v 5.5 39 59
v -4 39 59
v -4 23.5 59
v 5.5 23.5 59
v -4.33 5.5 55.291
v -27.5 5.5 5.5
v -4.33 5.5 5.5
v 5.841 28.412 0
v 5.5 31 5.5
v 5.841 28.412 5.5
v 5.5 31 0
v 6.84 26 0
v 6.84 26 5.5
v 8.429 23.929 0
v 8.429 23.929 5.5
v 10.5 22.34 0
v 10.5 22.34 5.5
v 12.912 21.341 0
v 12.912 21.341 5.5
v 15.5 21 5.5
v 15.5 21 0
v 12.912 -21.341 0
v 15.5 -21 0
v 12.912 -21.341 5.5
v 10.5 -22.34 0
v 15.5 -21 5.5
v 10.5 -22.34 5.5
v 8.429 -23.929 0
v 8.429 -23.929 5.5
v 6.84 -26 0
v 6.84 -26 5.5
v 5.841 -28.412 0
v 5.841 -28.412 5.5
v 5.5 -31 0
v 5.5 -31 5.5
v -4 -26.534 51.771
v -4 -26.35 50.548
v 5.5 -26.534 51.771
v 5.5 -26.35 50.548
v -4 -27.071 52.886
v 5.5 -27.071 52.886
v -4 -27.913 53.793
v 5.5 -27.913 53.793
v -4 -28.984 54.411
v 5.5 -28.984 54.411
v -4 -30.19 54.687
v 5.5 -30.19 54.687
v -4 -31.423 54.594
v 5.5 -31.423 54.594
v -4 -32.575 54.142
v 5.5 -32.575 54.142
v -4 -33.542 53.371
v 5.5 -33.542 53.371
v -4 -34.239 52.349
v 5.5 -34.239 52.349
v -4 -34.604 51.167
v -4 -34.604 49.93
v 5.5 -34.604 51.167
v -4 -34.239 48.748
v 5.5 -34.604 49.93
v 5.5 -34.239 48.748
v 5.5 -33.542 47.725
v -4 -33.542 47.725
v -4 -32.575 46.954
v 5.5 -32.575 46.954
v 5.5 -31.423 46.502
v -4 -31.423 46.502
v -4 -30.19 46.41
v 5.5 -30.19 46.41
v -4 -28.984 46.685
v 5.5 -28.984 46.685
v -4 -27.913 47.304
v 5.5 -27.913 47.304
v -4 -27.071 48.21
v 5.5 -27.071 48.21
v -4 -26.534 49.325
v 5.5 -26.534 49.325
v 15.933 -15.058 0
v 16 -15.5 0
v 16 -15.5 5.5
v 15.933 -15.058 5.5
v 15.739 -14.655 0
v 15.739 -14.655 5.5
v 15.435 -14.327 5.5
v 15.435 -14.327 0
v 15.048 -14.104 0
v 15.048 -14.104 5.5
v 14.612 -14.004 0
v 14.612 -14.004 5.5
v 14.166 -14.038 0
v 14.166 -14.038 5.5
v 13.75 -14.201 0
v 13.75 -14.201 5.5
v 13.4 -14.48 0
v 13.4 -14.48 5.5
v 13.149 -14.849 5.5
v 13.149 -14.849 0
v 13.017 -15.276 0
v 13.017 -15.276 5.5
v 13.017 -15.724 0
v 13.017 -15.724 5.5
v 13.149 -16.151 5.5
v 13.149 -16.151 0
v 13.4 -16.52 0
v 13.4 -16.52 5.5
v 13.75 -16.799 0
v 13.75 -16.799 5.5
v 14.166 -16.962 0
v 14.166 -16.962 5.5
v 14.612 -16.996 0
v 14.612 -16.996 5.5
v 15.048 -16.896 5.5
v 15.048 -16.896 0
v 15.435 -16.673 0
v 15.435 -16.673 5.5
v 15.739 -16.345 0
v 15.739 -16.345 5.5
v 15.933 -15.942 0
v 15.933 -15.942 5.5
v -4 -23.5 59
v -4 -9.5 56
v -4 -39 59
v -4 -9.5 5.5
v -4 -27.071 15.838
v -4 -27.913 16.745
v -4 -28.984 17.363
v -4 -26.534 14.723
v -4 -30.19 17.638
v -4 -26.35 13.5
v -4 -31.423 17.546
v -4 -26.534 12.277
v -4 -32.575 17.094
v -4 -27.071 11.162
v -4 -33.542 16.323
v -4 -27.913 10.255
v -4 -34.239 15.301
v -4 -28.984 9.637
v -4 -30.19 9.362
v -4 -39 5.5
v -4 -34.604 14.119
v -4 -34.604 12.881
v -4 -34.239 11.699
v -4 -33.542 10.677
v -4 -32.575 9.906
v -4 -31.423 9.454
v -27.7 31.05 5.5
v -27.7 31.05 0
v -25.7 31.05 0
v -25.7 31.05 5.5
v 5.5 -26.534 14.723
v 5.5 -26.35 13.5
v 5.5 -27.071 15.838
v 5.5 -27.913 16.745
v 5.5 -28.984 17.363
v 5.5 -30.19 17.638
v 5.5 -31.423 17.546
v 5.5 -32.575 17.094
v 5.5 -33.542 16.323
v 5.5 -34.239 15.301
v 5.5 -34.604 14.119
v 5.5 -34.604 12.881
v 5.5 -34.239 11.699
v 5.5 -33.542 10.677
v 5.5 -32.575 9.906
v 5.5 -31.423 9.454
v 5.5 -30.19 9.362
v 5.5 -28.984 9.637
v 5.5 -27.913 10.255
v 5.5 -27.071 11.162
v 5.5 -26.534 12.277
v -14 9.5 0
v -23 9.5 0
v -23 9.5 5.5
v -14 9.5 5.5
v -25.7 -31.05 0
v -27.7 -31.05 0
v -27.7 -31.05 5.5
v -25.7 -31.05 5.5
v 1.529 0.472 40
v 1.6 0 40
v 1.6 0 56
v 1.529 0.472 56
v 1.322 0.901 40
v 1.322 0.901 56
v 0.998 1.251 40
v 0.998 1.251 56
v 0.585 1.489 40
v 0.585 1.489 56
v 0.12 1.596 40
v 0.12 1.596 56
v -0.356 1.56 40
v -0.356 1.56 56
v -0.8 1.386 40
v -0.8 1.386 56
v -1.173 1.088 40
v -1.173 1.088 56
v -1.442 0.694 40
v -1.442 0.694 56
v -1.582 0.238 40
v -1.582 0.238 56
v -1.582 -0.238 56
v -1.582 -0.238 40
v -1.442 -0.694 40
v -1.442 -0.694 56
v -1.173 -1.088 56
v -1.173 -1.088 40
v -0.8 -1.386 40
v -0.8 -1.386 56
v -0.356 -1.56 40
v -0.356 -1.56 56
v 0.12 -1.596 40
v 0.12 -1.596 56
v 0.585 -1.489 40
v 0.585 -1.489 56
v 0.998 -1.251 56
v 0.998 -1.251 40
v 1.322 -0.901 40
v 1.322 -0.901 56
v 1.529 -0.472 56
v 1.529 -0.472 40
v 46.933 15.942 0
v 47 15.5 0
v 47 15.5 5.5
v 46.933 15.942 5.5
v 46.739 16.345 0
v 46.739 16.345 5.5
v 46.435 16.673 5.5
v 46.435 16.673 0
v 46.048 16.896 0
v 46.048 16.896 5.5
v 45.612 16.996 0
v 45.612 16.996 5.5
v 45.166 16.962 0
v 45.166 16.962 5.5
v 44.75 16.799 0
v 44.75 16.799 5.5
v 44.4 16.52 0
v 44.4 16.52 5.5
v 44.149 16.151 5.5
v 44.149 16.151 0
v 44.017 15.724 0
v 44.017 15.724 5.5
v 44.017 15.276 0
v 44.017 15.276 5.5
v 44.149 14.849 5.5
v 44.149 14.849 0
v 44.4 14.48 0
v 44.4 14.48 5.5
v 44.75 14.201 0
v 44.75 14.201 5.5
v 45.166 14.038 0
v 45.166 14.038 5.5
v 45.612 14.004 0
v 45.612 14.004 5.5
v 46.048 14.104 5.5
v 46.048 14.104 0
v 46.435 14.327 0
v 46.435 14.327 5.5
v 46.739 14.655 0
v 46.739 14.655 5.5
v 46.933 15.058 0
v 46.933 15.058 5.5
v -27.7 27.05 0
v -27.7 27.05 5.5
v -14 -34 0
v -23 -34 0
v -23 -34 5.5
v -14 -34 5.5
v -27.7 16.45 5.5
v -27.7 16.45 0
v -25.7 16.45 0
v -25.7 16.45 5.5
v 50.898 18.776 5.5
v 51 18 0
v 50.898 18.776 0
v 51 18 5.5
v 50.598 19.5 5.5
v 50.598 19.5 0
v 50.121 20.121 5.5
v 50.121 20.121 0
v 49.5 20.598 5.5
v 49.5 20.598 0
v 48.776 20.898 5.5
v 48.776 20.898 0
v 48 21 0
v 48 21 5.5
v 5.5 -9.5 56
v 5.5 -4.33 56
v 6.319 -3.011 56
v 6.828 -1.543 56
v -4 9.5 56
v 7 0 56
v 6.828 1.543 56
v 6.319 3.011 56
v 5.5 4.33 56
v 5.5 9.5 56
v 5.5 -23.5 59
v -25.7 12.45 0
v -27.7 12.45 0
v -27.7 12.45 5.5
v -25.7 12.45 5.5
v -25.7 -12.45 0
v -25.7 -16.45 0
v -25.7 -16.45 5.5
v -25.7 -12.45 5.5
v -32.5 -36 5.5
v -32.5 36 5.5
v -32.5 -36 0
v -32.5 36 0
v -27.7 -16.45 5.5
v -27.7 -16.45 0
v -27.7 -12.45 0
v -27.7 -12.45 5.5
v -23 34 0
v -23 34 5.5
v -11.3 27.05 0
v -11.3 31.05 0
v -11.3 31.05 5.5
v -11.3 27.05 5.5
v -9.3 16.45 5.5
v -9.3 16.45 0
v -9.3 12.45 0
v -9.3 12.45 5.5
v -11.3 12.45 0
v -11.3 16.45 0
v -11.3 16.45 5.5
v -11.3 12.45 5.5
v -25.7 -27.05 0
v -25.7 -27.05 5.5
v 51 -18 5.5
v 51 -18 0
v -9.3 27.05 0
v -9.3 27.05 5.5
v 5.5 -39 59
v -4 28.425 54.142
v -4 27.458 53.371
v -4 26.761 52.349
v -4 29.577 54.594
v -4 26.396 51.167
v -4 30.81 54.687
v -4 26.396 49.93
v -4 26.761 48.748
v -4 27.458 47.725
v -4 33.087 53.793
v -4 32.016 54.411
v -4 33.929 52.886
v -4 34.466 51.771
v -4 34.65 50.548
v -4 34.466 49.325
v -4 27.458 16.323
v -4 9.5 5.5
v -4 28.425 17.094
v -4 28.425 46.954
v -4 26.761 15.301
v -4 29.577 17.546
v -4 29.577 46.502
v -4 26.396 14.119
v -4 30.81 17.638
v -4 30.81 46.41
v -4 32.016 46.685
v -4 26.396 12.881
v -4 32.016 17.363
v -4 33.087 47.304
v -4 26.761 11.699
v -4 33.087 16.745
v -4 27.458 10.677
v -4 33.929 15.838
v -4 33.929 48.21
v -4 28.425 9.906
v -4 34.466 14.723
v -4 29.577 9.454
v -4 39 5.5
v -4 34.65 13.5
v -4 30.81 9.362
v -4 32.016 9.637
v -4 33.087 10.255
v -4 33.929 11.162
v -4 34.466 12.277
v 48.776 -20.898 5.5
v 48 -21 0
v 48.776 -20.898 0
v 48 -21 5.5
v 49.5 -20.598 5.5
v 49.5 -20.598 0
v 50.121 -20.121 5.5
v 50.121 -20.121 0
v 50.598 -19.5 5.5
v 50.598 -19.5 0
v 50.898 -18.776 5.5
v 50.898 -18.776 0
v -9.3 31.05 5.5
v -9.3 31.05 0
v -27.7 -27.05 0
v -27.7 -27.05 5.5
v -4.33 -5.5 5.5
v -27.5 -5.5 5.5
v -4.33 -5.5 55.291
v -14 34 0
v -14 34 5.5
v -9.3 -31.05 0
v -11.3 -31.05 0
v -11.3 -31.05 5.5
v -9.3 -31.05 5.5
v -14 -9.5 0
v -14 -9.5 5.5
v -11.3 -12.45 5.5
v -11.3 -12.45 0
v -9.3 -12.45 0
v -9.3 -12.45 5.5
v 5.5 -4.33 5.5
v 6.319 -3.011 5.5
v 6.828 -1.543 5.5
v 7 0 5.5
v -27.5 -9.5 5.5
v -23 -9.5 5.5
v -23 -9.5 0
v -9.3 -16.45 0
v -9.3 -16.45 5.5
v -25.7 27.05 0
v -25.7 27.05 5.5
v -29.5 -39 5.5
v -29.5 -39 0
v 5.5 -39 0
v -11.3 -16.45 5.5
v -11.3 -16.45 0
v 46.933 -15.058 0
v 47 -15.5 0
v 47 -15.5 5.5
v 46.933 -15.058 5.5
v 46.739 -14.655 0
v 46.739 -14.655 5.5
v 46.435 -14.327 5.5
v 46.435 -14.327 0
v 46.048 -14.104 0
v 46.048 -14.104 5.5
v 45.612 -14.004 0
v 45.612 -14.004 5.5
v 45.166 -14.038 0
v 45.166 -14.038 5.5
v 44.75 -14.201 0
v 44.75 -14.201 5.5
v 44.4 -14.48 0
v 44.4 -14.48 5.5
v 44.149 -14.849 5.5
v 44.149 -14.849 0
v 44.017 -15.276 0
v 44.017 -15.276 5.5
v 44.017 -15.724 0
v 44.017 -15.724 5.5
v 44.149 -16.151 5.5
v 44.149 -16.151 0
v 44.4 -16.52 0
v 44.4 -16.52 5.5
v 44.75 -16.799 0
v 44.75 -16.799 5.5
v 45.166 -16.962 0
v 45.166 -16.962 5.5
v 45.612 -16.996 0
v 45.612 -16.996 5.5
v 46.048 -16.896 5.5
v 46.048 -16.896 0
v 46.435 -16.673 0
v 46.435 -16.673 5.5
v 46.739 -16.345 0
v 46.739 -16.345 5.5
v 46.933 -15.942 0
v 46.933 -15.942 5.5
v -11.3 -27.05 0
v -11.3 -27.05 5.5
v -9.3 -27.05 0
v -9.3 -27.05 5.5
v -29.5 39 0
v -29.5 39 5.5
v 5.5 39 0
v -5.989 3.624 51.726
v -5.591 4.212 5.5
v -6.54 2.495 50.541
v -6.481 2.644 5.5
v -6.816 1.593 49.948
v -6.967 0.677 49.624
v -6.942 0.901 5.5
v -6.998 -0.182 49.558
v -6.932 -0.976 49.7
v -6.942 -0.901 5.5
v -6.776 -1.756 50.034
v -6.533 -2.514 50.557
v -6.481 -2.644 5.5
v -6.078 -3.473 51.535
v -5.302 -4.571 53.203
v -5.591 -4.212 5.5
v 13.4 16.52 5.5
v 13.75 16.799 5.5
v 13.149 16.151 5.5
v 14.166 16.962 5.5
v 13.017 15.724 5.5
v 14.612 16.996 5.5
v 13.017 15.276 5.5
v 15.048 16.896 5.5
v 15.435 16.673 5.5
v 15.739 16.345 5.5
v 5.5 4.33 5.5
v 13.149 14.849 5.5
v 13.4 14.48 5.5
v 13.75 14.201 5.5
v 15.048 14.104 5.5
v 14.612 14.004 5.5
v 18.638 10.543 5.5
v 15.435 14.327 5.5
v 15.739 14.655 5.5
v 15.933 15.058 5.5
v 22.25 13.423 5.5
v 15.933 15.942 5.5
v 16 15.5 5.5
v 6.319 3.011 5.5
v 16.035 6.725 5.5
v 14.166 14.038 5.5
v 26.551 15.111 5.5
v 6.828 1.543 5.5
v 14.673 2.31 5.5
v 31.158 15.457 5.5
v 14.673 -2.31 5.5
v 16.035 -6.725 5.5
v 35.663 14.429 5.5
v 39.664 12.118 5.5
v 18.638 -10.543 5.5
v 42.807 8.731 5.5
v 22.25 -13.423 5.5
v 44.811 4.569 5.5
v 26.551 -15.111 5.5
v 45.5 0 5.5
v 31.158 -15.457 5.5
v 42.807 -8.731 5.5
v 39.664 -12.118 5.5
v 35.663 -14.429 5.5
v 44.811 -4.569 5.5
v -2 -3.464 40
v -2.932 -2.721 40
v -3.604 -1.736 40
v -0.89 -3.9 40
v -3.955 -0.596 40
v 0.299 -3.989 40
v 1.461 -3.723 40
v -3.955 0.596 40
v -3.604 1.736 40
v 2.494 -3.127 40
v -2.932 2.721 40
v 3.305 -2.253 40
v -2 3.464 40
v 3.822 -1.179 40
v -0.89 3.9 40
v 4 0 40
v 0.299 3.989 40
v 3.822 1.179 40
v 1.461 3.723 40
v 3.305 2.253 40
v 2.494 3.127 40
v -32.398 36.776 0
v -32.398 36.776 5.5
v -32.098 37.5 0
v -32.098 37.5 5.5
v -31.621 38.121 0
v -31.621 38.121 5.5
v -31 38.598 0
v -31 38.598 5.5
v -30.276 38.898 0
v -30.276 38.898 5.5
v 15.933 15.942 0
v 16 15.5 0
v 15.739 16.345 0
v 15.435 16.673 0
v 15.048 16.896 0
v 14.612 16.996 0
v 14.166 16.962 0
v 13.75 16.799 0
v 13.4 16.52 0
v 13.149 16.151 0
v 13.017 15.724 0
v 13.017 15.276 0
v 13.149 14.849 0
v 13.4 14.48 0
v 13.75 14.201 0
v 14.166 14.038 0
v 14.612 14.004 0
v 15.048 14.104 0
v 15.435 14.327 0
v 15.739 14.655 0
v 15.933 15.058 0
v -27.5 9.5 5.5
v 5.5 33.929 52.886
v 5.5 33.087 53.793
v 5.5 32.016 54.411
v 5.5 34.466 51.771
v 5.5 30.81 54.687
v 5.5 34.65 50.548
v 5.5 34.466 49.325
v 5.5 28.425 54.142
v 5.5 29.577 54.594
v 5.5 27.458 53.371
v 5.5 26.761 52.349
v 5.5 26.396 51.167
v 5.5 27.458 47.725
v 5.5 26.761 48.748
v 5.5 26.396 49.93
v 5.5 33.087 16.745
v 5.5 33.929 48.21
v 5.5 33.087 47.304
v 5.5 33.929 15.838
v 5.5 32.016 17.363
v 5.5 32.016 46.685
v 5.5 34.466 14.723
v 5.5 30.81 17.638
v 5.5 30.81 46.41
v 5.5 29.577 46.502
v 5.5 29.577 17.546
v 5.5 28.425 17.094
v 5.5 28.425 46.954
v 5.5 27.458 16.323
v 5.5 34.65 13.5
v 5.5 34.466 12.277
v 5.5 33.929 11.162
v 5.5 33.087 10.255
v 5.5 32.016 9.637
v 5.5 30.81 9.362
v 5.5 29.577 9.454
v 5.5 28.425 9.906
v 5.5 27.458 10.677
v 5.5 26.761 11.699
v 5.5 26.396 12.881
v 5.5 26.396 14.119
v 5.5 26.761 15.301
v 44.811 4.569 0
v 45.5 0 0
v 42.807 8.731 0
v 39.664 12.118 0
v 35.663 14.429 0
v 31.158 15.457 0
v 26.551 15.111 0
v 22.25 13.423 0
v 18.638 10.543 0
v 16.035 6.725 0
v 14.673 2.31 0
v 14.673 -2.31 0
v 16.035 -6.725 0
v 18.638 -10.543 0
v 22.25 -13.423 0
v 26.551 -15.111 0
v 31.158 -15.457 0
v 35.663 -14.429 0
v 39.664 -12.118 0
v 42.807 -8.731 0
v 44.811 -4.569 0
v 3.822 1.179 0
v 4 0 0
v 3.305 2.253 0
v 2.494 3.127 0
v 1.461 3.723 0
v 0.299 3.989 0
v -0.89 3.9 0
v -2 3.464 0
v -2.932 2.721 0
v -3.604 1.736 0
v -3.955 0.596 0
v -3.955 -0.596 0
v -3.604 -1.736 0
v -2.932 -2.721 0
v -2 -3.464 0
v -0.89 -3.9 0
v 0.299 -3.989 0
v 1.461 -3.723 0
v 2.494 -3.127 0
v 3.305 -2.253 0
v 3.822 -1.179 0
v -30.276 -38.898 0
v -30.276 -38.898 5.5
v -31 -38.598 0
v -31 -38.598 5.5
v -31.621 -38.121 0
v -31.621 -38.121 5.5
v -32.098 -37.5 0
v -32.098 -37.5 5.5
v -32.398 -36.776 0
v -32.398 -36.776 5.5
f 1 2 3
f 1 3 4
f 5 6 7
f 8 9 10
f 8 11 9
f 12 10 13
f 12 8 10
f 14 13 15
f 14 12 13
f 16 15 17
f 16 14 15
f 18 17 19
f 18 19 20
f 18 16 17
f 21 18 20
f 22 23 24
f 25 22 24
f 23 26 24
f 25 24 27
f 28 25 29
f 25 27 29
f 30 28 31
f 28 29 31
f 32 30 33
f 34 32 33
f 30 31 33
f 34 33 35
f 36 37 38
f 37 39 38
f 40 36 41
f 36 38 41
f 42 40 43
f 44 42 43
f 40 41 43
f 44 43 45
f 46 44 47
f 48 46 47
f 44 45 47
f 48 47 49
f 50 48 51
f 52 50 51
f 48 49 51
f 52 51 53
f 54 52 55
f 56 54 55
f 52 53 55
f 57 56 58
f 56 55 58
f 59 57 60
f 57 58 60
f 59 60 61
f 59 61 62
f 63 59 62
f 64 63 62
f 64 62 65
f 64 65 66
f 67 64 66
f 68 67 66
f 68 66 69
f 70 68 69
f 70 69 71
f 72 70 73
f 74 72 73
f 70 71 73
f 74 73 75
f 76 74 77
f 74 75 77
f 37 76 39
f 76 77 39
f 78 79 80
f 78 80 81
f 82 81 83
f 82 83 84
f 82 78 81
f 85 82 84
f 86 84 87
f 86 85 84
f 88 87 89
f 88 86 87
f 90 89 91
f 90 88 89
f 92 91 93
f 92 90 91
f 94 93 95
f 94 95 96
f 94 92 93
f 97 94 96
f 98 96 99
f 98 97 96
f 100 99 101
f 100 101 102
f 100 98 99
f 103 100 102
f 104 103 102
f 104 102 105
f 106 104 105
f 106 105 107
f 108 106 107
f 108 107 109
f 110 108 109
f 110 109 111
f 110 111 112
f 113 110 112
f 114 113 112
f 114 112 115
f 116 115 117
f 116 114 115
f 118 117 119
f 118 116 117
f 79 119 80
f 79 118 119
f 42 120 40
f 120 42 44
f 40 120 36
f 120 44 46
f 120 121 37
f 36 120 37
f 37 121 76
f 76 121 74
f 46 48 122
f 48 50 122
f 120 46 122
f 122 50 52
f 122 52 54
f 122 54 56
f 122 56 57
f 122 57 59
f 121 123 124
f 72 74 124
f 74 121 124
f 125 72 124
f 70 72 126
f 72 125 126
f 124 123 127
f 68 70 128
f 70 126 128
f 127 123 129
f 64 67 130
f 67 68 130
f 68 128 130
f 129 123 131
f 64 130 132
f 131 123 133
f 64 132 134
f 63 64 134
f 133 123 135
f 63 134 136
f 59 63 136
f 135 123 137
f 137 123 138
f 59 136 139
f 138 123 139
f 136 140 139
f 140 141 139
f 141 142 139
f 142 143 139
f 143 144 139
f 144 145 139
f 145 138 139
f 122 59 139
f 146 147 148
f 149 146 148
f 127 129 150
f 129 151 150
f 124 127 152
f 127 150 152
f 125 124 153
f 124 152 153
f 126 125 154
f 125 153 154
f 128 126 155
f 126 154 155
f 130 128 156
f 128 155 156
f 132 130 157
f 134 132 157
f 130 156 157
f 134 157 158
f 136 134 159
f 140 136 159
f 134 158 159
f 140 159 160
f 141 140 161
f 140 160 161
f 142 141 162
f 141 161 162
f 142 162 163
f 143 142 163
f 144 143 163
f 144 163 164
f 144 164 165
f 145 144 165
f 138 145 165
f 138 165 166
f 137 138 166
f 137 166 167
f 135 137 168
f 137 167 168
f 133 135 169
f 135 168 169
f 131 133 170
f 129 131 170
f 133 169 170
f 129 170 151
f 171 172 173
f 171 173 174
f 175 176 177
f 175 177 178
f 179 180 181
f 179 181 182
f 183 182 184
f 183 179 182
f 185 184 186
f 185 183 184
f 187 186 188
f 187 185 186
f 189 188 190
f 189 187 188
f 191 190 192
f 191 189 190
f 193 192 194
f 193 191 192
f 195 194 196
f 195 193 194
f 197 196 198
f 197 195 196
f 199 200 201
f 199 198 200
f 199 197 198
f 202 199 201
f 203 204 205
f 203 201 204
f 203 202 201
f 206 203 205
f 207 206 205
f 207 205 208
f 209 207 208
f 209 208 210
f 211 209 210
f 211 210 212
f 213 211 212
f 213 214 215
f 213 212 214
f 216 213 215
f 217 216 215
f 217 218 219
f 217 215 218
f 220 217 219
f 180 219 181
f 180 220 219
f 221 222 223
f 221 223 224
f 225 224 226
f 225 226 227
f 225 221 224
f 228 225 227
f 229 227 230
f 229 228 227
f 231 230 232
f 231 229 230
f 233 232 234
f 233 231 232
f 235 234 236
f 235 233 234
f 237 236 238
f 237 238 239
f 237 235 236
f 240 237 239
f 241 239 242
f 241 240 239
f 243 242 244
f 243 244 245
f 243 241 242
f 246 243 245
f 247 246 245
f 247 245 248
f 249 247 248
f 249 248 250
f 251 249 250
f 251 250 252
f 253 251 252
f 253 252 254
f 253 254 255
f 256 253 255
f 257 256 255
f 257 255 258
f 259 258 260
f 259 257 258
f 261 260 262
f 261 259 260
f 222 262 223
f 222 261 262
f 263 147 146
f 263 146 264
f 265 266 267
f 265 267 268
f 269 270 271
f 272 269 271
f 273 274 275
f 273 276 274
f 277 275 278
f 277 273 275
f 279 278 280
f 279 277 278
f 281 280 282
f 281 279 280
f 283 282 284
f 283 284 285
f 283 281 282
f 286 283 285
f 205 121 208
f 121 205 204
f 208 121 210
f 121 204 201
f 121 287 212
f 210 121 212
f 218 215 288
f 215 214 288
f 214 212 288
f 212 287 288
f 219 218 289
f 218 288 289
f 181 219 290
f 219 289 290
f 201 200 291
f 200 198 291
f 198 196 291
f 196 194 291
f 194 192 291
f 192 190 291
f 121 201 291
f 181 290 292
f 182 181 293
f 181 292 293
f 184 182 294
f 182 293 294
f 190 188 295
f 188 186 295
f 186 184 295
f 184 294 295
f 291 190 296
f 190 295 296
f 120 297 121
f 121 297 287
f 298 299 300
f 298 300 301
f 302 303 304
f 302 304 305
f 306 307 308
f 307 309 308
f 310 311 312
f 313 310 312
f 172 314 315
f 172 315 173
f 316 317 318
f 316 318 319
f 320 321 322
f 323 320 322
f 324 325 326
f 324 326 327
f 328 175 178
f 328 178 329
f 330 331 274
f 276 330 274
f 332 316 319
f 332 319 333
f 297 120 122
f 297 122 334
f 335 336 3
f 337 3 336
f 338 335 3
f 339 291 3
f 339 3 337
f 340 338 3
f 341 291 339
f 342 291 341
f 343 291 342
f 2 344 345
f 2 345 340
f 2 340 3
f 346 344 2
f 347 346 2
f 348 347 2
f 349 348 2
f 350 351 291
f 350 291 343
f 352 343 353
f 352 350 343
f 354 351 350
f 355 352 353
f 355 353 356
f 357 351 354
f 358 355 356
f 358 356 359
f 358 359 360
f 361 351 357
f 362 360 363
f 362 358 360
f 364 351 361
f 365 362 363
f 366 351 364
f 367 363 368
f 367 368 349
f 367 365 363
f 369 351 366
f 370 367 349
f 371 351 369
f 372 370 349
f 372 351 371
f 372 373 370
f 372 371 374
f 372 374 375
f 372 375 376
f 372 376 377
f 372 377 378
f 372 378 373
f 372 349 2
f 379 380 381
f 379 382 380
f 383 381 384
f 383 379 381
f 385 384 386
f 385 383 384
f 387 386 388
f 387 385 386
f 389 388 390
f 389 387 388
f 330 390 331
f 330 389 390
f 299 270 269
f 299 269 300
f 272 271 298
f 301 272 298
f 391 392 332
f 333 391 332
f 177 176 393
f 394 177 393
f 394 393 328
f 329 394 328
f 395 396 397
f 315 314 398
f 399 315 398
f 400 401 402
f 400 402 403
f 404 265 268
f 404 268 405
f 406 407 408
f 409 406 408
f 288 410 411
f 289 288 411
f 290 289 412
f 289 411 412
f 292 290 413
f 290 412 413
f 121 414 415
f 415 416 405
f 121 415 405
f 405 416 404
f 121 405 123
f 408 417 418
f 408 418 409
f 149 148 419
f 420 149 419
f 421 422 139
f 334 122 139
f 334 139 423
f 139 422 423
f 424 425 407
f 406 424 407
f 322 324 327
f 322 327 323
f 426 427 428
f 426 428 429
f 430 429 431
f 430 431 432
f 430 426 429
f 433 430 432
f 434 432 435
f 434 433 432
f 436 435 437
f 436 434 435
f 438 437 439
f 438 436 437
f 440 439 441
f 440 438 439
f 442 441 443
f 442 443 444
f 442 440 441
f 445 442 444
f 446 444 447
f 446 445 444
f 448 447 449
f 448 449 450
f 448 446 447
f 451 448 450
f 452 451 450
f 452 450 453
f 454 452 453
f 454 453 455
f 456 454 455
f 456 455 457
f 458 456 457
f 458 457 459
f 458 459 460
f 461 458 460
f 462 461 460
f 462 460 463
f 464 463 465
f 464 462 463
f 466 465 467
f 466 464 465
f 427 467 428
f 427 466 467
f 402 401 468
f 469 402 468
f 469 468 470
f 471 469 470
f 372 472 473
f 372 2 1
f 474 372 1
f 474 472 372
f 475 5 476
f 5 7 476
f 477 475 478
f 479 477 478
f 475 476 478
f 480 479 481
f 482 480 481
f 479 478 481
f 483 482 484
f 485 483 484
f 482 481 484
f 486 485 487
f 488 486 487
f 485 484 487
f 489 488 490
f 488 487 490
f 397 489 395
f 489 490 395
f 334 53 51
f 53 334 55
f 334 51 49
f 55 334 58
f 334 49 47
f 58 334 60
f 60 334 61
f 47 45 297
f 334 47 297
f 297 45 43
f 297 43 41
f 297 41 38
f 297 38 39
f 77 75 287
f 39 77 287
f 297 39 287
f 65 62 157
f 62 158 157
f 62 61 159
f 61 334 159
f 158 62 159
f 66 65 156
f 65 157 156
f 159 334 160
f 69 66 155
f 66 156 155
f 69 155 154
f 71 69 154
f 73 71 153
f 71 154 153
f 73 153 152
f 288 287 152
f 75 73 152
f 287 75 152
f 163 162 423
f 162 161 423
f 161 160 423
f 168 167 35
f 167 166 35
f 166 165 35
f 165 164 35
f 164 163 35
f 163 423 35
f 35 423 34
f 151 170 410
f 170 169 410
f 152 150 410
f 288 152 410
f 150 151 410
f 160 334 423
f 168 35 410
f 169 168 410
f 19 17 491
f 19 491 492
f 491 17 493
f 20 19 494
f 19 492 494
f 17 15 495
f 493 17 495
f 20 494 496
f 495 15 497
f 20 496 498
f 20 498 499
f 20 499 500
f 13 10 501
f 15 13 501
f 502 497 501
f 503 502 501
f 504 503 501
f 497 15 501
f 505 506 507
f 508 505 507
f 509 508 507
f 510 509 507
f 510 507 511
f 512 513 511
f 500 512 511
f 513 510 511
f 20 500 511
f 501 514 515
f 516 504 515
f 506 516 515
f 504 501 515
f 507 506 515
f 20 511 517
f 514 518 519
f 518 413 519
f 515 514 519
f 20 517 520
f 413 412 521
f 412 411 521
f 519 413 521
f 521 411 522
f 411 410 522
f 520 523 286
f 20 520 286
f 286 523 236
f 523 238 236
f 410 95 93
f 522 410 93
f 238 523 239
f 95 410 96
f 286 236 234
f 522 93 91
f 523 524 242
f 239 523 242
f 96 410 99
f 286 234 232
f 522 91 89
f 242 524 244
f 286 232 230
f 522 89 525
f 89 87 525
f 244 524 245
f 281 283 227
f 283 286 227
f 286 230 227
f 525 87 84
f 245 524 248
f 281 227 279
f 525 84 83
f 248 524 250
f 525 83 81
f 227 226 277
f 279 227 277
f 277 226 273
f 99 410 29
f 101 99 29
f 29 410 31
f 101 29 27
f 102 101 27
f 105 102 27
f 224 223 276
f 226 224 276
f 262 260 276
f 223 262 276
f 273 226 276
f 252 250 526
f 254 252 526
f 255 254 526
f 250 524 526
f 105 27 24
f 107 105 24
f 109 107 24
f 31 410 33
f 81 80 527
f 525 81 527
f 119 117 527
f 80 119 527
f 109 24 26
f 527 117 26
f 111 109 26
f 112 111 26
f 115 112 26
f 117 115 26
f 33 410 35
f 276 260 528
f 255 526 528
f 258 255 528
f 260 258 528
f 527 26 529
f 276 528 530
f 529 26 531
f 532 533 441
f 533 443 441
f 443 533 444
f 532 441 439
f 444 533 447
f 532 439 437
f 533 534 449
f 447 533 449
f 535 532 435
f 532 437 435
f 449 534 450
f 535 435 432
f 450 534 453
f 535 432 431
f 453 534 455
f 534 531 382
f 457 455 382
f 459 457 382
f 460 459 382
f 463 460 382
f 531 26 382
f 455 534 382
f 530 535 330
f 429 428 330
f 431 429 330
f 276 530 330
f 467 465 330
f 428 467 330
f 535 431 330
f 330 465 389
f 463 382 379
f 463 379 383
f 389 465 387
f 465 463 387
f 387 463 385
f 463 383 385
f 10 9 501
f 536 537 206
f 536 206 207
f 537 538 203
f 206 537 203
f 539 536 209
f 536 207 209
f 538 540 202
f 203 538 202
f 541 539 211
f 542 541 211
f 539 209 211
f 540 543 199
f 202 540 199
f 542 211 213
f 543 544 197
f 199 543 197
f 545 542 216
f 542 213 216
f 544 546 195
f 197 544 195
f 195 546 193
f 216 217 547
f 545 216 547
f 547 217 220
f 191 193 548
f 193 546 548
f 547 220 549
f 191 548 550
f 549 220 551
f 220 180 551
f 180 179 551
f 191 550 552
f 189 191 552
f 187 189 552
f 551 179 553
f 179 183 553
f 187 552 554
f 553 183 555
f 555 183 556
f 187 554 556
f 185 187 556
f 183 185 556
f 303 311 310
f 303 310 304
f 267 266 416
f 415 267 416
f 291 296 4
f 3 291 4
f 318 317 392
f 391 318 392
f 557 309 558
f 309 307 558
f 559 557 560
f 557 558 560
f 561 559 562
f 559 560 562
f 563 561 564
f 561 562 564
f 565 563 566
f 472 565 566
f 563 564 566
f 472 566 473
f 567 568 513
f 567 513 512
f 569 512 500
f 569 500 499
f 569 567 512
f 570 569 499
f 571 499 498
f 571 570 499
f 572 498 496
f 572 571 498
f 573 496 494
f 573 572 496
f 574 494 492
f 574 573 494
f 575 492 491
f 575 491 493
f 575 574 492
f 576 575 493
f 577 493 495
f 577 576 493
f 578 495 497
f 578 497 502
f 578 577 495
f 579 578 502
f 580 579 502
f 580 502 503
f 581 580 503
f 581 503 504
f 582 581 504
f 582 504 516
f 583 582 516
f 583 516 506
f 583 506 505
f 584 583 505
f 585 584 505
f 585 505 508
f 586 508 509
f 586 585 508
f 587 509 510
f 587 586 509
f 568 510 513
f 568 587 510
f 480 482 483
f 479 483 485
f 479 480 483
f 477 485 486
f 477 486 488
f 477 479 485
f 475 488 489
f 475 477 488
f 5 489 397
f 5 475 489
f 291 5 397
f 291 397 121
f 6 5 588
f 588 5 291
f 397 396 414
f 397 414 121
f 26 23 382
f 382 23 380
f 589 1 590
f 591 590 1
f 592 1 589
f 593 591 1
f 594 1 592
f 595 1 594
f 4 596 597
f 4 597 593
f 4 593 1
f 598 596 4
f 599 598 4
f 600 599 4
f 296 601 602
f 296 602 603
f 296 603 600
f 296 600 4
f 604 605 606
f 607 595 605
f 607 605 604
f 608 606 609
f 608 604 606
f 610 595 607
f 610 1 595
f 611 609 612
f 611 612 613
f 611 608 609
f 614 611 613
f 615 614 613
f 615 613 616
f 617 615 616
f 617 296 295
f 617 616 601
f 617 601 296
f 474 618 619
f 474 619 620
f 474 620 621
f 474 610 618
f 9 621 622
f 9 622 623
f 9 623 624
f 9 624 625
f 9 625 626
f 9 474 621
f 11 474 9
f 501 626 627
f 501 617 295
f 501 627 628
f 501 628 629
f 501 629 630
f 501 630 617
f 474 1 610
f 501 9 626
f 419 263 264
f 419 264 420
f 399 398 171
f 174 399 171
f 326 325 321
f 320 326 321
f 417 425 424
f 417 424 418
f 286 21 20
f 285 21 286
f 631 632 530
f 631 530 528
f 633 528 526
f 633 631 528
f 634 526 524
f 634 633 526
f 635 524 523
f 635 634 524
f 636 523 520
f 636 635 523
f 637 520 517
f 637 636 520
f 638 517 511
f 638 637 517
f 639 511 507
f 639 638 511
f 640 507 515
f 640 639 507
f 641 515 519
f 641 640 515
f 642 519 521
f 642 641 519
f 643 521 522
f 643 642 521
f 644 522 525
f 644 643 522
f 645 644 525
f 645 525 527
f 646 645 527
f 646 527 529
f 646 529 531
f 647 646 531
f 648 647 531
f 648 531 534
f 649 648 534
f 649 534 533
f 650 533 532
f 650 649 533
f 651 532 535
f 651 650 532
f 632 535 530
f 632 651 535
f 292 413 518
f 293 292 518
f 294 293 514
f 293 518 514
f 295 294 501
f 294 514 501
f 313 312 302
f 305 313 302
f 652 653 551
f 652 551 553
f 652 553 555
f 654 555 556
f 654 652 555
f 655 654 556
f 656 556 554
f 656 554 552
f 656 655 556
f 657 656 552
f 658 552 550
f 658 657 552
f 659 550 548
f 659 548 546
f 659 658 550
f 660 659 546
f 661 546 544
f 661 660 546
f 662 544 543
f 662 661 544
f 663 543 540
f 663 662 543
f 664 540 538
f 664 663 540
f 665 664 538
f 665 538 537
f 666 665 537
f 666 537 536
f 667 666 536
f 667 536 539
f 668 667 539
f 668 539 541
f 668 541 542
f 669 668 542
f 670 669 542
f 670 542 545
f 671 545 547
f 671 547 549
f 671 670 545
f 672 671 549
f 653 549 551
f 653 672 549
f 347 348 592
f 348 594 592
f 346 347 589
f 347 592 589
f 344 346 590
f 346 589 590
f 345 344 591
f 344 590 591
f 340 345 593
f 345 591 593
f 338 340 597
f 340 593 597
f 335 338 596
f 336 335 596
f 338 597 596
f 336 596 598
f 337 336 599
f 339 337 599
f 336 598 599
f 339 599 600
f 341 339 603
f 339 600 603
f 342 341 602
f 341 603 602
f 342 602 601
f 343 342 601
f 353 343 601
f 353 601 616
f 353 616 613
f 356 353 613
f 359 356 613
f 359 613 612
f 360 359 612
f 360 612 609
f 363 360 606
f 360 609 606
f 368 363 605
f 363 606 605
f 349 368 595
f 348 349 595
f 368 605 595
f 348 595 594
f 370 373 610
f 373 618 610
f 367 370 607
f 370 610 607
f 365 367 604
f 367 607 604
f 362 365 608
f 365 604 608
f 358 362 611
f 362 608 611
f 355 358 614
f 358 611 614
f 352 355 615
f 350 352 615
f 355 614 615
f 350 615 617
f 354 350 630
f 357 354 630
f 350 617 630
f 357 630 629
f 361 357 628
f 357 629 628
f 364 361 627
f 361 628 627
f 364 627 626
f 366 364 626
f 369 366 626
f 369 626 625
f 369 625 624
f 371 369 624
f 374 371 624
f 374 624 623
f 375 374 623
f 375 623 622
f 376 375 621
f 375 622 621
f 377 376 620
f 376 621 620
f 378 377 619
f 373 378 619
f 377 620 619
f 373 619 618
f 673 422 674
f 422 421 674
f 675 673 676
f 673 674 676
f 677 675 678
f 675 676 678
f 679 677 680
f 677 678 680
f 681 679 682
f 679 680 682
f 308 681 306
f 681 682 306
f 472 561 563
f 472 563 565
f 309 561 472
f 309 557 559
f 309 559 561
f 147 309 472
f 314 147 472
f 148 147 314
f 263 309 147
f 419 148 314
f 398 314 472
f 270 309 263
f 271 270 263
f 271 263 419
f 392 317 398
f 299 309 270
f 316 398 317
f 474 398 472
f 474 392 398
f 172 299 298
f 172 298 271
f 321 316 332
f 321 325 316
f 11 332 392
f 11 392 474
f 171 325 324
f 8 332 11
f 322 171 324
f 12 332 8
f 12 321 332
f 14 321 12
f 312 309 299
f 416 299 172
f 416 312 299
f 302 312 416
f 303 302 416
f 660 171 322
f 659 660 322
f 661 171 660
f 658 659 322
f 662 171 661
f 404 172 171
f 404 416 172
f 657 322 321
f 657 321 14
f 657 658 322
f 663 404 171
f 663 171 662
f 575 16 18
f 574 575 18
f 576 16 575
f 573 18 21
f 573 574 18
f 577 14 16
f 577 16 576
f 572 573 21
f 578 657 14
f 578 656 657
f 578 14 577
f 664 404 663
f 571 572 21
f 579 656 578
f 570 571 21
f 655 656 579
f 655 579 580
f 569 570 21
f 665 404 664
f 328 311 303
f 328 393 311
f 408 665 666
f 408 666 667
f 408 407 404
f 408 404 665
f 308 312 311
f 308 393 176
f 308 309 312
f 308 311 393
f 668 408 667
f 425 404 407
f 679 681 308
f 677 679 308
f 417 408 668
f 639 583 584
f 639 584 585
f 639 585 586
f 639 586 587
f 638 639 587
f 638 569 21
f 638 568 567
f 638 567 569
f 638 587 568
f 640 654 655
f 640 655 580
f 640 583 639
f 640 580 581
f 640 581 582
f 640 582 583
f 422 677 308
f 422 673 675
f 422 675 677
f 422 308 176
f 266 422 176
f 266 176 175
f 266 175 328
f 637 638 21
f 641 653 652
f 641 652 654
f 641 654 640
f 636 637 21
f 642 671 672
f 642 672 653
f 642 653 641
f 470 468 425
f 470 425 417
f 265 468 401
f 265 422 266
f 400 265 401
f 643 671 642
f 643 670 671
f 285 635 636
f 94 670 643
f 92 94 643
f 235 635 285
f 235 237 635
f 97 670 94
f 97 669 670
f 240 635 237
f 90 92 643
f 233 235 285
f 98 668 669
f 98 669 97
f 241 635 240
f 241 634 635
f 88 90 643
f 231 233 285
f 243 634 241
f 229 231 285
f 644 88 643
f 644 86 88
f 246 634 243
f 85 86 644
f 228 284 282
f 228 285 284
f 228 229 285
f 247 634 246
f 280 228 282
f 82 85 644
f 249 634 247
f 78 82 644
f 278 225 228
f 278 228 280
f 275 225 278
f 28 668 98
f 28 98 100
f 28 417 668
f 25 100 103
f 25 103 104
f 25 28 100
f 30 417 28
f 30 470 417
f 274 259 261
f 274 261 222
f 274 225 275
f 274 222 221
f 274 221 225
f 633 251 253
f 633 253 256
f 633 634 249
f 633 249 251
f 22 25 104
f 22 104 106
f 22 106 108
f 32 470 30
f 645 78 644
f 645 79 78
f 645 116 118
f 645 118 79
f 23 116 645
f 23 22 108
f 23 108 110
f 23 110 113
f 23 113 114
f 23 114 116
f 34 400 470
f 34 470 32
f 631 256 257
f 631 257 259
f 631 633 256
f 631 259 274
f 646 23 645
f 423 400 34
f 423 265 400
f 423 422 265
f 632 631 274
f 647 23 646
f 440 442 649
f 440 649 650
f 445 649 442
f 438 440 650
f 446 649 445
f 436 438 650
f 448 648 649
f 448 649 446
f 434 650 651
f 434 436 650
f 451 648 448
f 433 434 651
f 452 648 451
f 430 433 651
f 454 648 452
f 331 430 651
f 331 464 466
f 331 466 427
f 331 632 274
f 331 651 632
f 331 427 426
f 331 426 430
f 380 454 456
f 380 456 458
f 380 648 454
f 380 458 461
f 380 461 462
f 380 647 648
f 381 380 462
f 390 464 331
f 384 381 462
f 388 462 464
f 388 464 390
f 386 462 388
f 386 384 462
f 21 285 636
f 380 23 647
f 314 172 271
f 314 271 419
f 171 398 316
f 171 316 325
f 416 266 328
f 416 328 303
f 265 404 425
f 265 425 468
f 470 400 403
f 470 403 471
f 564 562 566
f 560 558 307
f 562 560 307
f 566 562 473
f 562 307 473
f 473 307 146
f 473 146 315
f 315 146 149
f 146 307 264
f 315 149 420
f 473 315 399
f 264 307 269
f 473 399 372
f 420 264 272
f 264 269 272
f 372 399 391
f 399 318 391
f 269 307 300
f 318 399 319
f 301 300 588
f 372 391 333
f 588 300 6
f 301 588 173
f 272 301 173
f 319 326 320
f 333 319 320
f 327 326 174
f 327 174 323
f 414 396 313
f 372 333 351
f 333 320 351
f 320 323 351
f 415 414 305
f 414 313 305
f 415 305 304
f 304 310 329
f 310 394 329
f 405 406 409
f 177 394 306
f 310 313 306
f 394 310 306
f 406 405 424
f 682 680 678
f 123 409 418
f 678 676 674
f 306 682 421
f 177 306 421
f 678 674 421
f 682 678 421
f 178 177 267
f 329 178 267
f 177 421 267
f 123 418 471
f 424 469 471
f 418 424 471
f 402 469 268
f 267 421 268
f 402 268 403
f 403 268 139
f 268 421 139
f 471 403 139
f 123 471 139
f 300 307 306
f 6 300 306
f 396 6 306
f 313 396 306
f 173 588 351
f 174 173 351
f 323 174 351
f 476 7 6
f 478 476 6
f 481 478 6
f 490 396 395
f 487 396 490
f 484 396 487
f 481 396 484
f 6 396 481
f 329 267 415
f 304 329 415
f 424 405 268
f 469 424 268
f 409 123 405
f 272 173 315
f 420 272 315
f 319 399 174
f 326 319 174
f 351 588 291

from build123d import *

# Parameters (mm, degrees)
F0_W         = 51
F0_H         = 42
F0_R         = 1.5
F0_R_2       = 15.5
F4_DEPTH     = 5.5
F1_W         = 32.5
F1_H         = 39
F1_W_2       = 2
F1_H_2       = 4
F1_W_3       = 9
F1_H_3       = 24.5
F5_DEPTH     = 5.5
F6_DEPTH     = 59
F3_W         = 27.5
F3_H         = 4
F7_DEPTH     = 56
F8_R         = 4.15
F9_DEPTH     = 6
F10_DEPTH    = 40
F11_DEPTH    = 153
F12_R        = 10
F13_R        = 3
F15_DEPTH    = 10.56991
F16_T4_DEPTH = 265.6917724847
F16_T9_DEPTH = 265.6917724847


# Not quite as in the source:
# - a fillet or chamfer that OpenCascade refuses, or shapes differently, is made with other operations: its cross-section is extruded or revolved along the edge and cut away or added
# - an extrude ends at something that could not be found from the text; its depth is read off the source's solid
# - a pattern or mirror of a feature is missing from the dataset's text; its kind, count and spacing are read off the source's solid


with BuildPart() as f4:
    # F0 (on Top) → F4 (new body)
    with BuildSketch(Plane.XY):
        with Locations((25.5, 0)):
            Rectangle(F0_W, F0_H)
        with Locations((14.5, -15.5)):
            Circle(F0_R, mode=Mode.SUBTRACT)
        with Locations((45.5, -15.5)):
            Circle(F0_R, mode=Mode.SUBTRACT)
        with Locations((14.5, 15.5)):
            Circle(F0_R, mode=Mode.SUBTRACT)
        with Locations((30, 0)):
            Circle(F0_R_2, mode=Mode.SUBTRACT)
        with Locations((45.5, 15.5)):
            Circle(F0_R, mode=Mode.SUBTRACT)
    extrude(amount=F4_DEPTH)

    # F1 (on Top) → F5 (join, through all)
    with BuildSketch(Plane.XY):
        with Locations((-16.25, -19.5)):
            Rectangle(F1_W, F1_H)
        with Locations((-26.7, -29.05)):
            Rectangle(F1_W_2, F1_H_2, mode=Mode.SUBTRACT)
        with Locations((-18.5, -21.75)):
            Rectangle(F1_W_3, F1_H_3, mode=Mode.SUBTRACT)
        with Locations((-10.3, -29.05)):
            Rectangle(F1_W_2, F1_H_2, mode=Mode.SUBTRACT)
        with Locations((-26.7, -14.45)):
            Rectangle(F1_W_2, F1_H_2, mode=Mode.SUBTRACT)
        with Locations((-10.3, -14.45)):
            Rectangle(F1_W_2, F1_H_2, mode=Mode.SUBTRACT)
    f5 = extrude(amount=F5_DEPTH)

    # F5_copies: F5 across plane
    add(f5.mirror(Plane.ZX))

    # F2 (on Top) → F6 (join)
    with BuildSketch(Plane.XY):
        with BuildLine():
            ThreePointArc((5.5, -4.3301270189), (1.0308525773, -6.9236798716), (-4, -5.7445626465))
            Line((-4, -5.7445626465), (-4, -39))
            Line((-4, -39), (5.5, -39))
            Line((5.5, -39), (5.5, -4.3301270189))
        make_face()
        with BuildLine():
            Line((-4, 0), (-4, -5.7445626465))
            ThreePointArc((-4, -5.7445626465), (1.0308525773, -6.9236798716), (5.5, -4.3301270189))
            Line((5.5, -4.3301270189), (5.5, 0))
            Line((5.5, 0), (4, 0))
            ThreePointArc((4, 0), (0, -4), (-4, 0))
        make_face()
        with BuildLine():
            ThreePointArc((5.5, -4.3301270189), (6.6143782777, -2.2912878475), (7, 0))
            ThreePointArc((7, 0), (-3.2403703492, 6.204836823), (-4, -5.7445626465))
            Line((-4, -5.7445626465), (-4, 0))
            ThreePointArc((-4, 0), (0, 4), (4, 0))
            Line((4, 0), (5.5, 0))
            Line((5.5, 0), (5.5, -4.3301270189))
        make_face()
        with BuildLine():
            Line((-1.6, 0), (-4, 0))
            ThreePointArc((-4, 0), (0, -4), (4, 0))
            Line((4, 0), (1.6, 0))
            ThreePointArc((1.6, 0), (0, -1.6), (-1.6, 0))
        make_face()
        with BuildLine():
            ThreePointArc((4, 0), (0, 4), (-4, 0))
            Line((-4, 0), (-1.6, 0))
            ThreePointArc((-1.6, 0), (0, 1.6), (1.6, 0))
            Line((1.6, 0), (4, 0))
        make_face()
        with BuildLine():
            ThreePointArc((1.6, 0), (0, 1.6), (-1.6, 0))
            Line((-1.6, 0), (1.6, 0))
        make_face()
        with BuildLine():
            Line((1.6, 0), (-1.6, 0))
            ThreePointArc((-1.6, 0), (0, -1.6), (1.6, 0))
        make_face()
    f6 = extrude(amount=F6_DEPTH)

    # F6_copies: F6 across plane
    add(f6.mirror(Plane.ZX))

    # F3 (on Top) → F7 (join)
    with BuildSketch(Plane.XY):
        with Locations((-13.75, -7.5)):
            Rectangle(F3_W, F3_H)
    f7 = extrude(amount=F7_DEPTH)

    # F7_copies: F7 across plane
    add(f7.mirror(Plane.ZX.offset(-9e-06)))

    # F8 (on Right) → F9 (cut, symmetric)
    with BuildSketch(Plane.YZ):
        with Locations((30.5, 50.5481660366)):
            Circle(F8_R)
        with Locations((30.5, 13.5)):
            Circle(F8_R)
        with Locations((-30.5, 13.5)):
            Circle(F8_R)
        with Locations((-30.5, 50.5481660366)):
            Circle(F8_R)
    extrude(amount=F9_DEPTH, both=True, mode=Mode.SUBTRACT)

    # F2 (on Top) → F10 (cut)
    with BuildSketch(Plane.XY):
        with BuildLine():
            Line((-1.6, 0), (-4, 0))
            ThreePointArc((-4, 0), (0, -4), (4, 0))
            Line((4, 0), (1.6, 0))
            ThreePointArc((1.6, 0), (0, -1.6), (-1.6, 0))
        make_face()
        with BuildLine():
            ThreePointArc((4, 0), (0, 4), (-4, 0))
            Line((-4, 0), (-1.6, 0))
            ThreePointArc((-1.6, 0), (0, 1.6), (1.6, 0))
            Line((1.6, 0), (4, 0))
        make_face()
        with BuildLine():
            ThreePointArc((1.6, 0), (0, 1.6), (-1.6, 0))
            Line((-1.6, 0), (1.6, 0))
        make_face()
        with BuildLine():
            Line((1.6, 0), (-1.6, 0))
            ThreePointArc((-1.6, 0), (0, -1.6), (1.6, 0))
        make_face()
    extrude(amount=F10_DEPTH, mode=Mode.SUBTRACT)

    # F2 (on Top) → F11 (cut, through all)
    with BuildSketch(Plane.XY):
        with BuildLine():
            Line((1.6, 0), (-1.6, 0))
            ThreePointArc((-1.6, 0), (0, -1.6), (1.6, 0))
        make_face()
        with BuildLine():
            ThreePointArc((1.6, 0), (0, 1.6), (-1.6, 0))
            Line((-1.6, 0), (1.6, 0))
        make_face()
    extrude(amount=F11_DEPTH, mode=Mode.SUBTRACT)

    # F12
    f12_edges = [f4.edges().sort_by_distance(p)[0] for p in [
        (5.5, -21, 2.75),
        (5.5, 21, 2.75),
    ]]
    fillet(f12_edges, radius=F12_R)

    # F13
    f13_edges = [f4.edges().sort_by_distance(p)[0] for p in [
        (51, 21, 2.75),
        (51, -21, 2.75),
        (-32.5, -39, 2.75),
        (-32.5, 39, 2.75),
    ]]
    fillet(f13_edges, radius=F13_R)

    # F14 (on Right) → F15 (cut, symmetric)
    with BuildSketch(Plane.YZ):
        Polygon((23.5, 59), (-23.5, 59), (-9.5, 56), (9.5, 56), align=None)
    extrude(amount=F15_DEPTH, both=True, mode=Mode.SUBTRACT)

    # F16: chamfer of 23.5 x 50.5 on 2 edges, made by hand


with BuildPart() as f16_tool2:
    # F16_s3 → F16_t4 (new body)
    with BuildSketch(Plane.XZ.offset(-125.3458862424)):
        Polygon((-27.5, 5.5), (-4, 56), (-27.5, 56), align=None)
    extrude(amount=F16_T4_DEPTH)

    split(bisect_by=Plane.XY.offset(5.5), keep=Keep.TOP)


with BuildPart() as f4_1:
    add(f4.part)

    # F16_t1: cut F16_tool2
    add(f16_tool2.part, mode=Mode.SUBTRACT)


with BuildPart() as f16_tool7:
    # F16_s8 → F16_t9 (new body)
    with BuildSketch(Plane.XZ.offset(125.3459042424)):
        Polygon((-27.5, 5.5), (-4, 56), (-27.5, 56), align=None)
    extrude(amount=-F16_T9_DEPTH)

    split(bisect_by=Plane.XY.offset(5.5), keep=Keep.TOP)


with BuildPart() as f4_2:
    add(f4_1.part)

    # F16_t6: cut F16_tool7
    add(f16_tool7.part, mode=Mode.SUBTRACT)


solid = f4_2.part
